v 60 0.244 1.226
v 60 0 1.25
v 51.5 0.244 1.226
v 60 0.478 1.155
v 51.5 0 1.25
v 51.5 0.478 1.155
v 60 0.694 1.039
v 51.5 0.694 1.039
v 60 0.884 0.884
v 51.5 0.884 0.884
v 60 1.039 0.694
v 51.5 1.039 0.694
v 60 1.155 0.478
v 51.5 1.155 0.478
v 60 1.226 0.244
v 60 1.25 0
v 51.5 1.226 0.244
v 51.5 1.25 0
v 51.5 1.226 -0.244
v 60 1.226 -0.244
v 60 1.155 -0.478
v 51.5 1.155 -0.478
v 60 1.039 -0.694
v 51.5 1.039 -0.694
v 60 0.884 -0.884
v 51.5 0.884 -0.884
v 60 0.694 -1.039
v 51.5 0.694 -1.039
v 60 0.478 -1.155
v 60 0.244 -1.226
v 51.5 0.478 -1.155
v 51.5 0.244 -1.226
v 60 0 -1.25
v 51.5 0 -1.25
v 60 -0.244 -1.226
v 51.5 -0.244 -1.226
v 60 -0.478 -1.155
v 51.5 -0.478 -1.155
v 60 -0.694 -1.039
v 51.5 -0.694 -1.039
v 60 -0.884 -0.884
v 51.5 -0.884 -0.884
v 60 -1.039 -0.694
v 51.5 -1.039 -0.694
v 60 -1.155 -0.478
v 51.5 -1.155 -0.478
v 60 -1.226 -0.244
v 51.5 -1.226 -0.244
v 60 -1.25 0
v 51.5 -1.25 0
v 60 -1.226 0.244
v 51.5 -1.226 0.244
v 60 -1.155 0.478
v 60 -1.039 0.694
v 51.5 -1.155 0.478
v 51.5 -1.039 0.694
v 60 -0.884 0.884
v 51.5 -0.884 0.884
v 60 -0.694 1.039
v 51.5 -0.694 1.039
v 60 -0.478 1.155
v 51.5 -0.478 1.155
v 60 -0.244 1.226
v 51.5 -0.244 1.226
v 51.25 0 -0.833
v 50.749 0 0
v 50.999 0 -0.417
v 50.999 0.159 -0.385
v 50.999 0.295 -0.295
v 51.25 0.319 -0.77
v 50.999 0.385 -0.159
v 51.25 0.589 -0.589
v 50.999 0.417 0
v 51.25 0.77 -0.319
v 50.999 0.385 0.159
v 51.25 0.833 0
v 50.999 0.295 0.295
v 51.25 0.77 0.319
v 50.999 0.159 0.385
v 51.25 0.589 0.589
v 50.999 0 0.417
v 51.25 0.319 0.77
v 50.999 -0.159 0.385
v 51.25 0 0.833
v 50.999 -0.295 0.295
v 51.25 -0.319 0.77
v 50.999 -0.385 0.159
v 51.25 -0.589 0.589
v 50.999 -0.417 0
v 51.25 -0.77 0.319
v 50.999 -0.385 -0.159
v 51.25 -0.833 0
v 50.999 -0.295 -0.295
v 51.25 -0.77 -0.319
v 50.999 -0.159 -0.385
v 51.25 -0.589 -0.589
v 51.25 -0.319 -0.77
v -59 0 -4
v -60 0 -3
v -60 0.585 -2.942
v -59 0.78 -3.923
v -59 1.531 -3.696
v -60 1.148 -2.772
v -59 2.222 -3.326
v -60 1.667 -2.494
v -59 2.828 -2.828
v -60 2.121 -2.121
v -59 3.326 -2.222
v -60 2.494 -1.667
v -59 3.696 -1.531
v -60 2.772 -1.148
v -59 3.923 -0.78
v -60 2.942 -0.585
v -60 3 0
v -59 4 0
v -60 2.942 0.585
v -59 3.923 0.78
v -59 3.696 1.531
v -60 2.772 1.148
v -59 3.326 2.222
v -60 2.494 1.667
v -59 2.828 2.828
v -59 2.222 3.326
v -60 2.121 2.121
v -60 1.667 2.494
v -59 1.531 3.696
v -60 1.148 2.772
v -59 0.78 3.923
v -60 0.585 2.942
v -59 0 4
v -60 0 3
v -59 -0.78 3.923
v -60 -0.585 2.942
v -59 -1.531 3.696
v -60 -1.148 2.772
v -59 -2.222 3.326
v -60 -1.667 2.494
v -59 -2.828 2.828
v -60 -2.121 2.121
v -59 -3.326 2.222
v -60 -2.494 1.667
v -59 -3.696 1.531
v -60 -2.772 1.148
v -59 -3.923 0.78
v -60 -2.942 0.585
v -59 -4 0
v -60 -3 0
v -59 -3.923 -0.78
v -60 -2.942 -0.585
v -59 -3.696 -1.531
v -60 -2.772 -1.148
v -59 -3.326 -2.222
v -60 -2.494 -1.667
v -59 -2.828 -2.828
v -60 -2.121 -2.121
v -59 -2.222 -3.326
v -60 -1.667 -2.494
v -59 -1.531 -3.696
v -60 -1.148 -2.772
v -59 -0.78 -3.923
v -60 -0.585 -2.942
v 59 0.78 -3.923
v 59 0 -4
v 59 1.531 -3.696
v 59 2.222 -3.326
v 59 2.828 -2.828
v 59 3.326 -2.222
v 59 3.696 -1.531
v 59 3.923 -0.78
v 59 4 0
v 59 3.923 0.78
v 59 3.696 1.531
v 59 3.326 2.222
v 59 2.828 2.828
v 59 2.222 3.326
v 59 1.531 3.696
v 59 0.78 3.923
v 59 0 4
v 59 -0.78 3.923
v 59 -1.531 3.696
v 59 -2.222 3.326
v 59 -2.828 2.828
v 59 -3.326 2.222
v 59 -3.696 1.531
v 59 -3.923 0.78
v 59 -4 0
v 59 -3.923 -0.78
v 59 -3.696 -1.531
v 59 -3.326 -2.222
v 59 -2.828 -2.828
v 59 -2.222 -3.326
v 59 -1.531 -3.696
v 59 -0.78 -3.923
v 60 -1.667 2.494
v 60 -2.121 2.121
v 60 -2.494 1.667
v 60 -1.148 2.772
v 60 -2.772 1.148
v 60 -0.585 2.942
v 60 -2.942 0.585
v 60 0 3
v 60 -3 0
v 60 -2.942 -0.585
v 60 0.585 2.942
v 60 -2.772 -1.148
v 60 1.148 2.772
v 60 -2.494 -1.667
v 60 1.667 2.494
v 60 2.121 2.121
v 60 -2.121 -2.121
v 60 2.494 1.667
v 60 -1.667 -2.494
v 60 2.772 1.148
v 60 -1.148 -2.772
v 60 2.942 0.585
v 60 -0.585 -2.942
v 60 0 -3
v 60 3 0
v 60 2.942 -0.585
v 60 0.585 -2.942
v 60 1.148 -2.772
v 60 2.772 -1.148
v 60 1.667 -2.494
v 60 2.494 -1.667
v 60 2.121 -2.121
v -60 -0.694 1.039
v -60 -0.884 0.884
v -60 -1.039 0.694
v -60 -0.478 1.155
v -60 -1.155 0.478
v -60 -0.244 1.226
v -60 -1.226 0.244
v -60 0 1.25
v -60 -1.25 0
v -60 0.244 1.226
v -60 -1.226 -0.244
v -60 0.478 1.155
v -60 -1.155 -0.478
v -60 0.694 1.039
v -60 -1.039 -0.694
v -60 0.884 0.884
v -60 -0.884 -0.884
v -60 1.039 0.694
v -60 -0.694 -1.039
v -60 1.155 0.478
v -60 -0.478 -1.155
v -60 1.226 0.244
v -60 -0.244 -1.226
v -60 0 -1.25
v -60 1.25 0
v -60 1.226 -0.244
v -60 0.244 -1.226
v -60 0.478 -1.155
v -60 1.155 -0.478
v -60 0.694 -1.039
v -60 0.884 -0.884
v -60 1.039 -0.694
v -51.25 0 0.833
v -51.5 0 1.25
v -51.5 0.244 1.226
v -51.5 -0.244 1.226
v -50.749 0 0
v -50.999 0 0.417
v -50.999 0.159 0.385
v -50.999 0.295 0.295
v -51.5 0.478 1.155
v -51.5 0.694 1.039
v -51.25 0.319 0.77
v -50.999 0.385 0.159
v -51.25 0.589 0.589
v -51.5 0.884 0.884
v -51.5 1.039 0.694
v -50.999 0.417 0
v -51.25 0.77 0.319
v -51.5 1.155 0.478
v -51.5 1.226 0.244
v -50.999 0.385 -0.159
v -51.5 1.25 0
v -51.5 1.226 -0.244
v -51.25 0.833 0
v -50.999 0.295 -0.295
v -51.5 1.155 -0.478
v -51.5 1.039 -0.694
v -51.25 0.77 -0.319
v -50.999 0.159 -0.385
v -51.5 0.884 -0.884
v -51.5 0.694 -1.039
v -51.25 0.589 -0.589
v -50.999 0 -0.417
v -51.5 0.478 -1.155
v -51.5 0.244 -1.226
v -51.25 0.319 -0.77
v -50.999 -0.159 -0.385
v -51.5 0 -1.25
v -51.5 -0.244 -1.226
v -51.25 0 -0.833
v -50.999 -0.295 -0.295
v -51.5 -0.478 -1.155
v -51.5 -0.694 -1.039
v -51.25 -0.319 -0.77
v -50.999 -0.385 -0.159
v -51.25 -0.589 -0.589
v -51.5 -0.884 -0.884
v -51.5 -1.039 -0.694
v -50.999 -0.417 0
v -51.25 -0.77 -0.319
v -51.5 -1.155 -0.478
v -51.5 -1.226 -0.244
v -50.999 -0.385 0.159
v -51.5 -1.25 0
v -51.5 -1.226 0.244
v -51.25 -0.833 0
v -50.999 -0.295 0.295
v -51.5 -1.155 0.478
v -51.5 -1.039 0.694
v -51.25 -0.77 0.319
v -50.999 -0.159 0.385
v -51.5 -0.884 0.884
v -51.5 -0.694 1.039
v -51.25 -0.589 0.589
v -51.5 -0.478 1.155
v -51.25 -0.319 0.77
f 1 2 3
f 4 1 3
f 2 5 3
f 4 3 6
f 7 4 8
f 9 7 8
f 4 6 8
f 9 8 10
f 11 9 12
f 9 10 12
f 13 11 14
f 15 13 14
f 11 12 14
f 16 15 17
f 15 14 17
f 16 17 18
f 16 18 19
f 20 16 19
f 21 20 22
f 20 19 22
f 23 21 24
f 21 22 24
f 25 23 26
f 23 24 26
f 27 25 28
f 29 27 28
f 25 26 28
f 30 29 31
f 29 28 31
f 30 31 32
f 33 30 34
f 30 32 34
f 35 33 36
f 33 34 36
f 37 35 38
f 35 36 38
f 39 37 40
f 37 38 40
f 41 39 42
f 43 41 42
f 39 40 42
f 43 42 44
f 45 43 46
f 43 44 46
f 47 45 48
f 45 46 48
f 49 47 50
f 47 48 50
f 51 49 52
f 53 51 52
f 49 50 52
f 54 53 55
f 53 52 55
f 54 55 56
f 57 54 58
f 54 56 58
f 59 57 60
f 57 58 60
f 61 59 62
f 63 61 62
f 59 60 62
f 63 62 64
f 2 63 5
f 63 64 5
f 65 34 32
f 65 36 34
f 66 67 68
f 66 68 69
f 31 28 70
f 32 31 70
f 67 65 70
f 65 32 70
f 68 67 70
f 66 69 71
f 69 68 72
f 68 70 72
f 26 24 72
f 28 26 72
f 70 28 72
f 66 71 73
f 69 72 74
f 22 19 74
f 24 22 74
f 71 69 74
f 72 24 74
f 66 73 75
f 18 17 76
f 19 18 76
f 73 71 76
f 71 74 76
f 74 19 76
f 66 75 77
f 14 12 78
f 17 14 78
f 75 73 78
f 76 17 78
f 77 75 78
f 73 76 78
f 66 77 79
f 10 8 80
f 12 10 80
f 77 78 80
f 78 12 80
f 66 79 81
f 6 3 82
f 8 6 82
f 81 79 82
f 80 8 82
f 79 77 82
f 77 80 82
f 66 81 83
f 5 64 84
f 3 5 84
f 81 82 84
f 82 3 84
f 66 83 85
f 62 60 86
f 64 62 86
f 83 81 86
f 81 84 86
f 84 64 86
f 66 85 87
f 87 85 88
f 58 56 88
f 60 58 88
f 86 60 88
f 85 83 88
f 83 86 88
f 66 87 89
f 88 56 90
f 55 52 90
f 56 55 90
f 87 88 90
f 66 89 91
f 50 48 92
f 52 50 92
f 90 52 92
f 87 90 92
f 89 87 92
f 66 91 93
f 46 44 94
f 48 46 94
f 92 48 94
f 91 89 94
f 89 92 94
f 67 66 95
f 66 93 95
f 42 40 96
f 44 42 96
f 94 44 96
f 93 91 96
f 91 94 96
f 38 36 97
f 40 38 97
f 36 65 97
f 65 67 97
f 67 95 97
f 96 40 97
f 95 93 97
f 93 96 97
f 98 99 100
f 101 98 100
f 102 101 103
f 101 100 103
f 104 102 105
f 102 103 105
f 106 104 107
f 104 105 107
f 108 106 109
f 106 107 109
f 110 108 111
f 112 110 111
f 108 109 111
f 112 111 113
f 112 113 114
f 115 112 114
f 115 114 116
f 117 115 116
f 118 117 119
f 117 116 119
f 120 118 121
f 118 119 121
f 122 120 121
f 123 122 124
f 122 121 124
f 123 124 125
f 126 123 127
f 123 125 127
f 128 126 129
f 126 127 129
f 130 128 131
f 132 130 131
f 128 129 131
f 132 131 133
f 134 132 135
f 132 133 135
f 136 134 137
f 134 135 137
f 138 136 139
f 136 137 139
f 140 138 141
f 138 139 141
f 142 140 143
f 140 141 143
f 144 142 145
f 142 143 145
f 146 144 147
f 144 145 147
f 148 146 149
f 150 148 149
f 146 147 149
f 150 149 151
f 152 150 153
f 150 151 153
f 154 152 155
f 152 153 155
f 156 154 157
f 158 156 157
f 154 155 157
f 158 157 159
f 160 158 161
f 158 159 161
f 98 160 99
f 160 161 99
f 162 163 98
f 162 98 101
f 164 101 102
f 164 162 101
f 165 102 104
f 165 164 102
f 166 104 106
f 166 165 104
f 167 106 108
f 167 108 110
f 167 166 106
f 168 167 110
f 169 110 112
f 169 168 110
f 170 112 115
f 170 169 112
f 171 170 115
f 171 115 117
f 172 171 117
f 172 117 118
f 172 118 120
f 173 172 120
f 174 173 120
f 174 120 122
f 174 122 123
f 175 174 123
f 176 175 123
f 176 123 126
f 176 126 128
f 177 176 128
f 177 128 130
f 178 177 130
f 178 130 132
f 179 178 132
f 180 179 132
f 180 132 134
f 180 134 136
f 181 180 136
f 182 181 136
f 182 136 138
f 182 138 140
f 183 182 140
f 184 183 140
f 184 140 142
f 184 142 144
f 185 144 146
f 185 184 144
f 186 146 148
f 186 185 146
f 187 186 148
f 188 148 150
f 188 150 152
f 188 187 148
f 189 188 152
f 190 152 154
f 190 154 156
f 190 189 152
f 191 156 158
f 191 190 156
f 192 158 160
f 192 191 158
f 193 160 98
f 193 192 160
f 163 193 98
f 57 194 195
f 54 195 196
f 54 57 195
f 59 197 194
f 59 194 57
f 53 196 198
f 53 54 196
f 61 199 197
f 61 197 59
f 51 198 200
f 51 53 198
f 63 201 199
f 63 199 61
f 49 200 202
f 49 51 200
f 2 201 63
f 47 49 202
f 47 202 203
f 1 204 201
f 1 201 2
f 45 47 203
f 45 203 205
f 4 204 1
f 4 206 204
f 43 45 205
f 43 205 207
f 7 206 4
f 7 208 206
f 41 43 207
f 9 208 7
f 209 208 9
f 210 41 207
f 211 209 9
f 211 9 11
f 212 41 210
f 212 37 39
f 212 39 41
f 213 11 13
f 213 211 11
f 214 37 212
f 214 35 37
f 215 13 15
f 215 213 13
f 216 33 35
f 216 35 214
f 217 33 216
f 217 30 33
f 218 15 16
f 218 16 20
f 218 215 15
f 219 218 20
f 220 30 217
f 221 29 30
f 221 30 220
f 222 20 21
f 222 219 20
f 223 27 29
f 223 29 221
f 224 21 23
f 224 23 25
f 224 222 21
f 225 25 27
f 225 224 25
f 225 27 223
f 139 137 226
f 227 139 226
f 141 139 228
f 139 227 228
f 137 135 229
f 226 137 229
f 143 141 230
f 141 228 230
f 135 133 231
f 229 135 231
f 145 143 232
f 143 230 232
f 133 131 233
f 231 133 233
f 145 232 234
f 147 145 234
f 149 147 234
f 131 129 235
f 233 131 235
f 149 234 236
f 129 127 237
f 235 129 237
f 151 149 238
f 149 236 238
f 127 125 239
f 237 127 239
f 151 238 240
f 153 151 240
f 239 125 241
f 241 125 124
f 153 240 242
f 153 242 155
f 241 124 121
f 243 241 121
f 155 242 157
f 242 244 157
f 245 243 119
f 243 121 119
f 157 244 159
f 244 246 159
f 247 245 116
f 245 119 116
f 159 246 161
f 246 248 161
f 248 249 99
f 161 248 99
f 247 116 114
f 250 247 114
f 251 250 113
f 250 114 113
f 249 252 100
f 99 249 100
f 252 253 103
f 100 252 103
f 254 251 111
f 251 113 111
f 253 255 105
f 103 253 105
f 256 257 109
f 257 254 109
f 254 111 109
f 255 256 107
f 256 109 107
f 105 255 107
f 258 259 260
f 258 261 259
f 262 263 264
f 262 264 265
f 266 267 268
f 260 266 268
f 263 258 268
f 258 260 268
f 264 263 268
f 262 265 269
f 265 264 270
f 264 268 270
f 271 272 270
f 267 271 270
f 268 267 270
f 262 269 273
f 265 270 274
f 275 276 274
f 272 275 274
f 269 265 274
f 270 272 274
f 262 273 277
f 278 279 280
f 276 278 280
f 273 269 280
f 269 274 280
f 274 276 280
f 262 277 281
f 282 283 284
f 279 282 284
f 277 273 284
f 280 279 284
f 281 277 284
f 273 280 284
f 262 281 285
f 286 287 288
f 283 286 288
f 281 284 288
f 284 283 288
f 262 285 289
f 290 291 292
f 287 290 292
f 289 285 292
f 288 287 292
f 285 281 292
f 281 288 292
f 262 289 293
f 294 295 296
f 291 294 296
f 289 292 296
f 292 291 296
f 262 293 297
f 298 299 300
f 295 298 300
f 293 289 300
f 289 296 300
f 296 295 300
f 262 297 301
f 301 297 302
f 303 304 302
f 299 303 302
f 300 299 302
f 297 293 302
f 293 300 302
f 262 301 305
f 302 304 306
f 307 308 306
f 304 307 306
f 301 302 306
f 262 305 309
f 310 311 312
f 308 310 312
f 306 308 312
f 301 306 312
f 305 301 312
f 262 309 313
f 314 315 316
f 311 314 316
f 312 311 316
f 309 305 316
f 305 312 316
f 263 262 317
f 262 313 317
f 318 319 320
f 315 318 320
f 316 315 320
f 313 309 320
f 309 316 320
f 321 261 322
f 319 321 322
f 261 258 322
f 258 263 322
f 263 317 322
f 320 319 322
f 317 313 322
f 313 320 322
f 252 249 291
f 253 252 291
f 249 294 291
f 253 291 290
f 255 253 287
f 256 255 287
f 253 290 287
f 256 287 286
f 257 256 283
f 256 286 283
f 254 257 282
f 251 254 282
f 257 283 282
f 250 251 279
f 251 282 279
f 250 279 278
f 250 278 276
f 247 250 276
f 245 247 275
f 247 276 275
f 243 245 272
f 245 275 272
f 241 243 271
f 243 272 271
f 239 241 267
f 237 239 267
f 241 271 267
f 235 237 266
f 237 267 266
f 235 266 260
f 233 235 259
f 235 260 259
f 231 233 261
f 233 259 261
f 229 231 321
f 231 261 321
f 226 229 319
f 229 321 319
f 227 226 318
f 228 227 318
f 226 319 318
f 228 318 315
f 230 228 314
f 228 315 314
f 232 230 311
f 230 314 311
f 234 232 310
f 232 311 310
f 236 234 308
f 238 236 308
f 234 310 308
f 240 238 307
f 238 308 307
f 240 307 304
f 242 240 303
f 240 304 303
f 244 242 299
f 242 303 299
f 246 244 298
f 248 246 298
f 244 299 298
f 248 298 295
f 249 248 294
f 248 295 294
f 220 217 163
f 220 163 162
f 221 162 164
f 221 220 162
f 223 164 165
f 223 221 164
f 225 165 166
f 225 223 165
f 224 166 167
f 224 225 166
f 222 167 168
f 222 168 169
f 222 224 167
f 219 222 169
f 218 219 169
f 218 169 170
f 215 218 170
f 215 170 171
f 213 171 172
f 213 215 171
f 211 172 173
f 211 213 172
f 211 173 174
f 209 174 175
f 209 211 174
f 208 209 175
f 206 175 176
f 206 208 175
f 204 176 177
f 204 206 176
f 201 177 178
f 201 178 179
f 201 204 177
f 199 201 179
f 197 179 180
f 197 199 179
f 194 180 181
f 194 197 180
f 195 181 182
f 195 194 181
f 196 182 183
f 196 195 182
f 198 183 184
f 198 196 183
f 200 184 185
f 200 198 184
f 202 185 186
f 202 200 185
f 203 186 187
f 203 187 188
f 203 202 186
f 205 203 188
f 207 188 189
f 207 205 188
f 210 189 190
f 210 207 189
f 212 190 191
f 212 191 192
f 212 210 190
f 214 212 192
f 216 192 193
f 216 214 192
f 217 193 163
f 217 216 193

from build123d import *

# Parameters (mm, degrees)
ESQUISSE1_R           = 4
BOSS_EXTRU_1_DEPTH    = 60
CHANFREIN1_SIZE       = 1
TROU_TARAUD_M31_D     = 2.5
TROU_TARAUD_M31_DEPTH = 8.5
TROU_TARAUD_M31_TIP   = 0.751075774
TROU_TARAUD_M32_D     = 2.5
TROU_TARAUD_M32_DEPTH = 8.5
TROU_TARAUD_M32_TIP   = 0.751075774


with BuildPart() as part:
    # Esquisse1 → Boss.-Extru.1 (new, symmetric)
    with BuildSketch(Plane(origin=(0, 0, 0), x_dir=(0, 0, -1), z_dir=(1, 0, 0))):
        Circle(ESQUISSE1_R)
    extrude(amount=BOSS_EXTRU_1_DEPTH, both=True)

    # Chanfrein1
    chanfrein1_edges = [part.edges().sort_by_distance(p)[0] for p in [
        (-60, 0, 4),
        (60, 0, 4),
    ]]
    chamfer(chanfrein1_edges, length=CHANFREIN1_SIZE)

    # Trou taraudé M31
    with Locations(Plane(origin=(60, 0, 0), x_dir=(0, 0, -1), z_dir=(1, 0, 0))):
        with Locations((0, 0)):
            Hole(TROU_TARAUD_M31_D / 2, depth=TROU_TARAUD_M31_DEPTH)
            with Locations((0, 0, -(TROU_TARAUD_M31_DEPTH + TROU_TARAUD_M31_TIP / 2))):  # 118° drill point
                Cone(0, TROU_TARAUD_M31_D / 2, TROU_TARAUD_M31_TIP, mode=Mode.SUBTRACT)

    # Trou taraudé M32
    with Locations(Plane.ZY.offset(60)):
        with Locations((0, 0)):
            Hole(TROU_TARAUD_M32_D / 2, depth=TROU_TARAUD_M32_DEPTH)
            with Locations((0, 0, -(TROU_TARAUD_M32_DEPTH + TROU_TARAUD_M32_TIP / 2))):  # 118° drill point
                Cone(0, TROU_TARAUD_M32_D / 2, TROU_TARAUD_M32_TIP, mode=Mode.SUBTRACT)


solid = part.part
